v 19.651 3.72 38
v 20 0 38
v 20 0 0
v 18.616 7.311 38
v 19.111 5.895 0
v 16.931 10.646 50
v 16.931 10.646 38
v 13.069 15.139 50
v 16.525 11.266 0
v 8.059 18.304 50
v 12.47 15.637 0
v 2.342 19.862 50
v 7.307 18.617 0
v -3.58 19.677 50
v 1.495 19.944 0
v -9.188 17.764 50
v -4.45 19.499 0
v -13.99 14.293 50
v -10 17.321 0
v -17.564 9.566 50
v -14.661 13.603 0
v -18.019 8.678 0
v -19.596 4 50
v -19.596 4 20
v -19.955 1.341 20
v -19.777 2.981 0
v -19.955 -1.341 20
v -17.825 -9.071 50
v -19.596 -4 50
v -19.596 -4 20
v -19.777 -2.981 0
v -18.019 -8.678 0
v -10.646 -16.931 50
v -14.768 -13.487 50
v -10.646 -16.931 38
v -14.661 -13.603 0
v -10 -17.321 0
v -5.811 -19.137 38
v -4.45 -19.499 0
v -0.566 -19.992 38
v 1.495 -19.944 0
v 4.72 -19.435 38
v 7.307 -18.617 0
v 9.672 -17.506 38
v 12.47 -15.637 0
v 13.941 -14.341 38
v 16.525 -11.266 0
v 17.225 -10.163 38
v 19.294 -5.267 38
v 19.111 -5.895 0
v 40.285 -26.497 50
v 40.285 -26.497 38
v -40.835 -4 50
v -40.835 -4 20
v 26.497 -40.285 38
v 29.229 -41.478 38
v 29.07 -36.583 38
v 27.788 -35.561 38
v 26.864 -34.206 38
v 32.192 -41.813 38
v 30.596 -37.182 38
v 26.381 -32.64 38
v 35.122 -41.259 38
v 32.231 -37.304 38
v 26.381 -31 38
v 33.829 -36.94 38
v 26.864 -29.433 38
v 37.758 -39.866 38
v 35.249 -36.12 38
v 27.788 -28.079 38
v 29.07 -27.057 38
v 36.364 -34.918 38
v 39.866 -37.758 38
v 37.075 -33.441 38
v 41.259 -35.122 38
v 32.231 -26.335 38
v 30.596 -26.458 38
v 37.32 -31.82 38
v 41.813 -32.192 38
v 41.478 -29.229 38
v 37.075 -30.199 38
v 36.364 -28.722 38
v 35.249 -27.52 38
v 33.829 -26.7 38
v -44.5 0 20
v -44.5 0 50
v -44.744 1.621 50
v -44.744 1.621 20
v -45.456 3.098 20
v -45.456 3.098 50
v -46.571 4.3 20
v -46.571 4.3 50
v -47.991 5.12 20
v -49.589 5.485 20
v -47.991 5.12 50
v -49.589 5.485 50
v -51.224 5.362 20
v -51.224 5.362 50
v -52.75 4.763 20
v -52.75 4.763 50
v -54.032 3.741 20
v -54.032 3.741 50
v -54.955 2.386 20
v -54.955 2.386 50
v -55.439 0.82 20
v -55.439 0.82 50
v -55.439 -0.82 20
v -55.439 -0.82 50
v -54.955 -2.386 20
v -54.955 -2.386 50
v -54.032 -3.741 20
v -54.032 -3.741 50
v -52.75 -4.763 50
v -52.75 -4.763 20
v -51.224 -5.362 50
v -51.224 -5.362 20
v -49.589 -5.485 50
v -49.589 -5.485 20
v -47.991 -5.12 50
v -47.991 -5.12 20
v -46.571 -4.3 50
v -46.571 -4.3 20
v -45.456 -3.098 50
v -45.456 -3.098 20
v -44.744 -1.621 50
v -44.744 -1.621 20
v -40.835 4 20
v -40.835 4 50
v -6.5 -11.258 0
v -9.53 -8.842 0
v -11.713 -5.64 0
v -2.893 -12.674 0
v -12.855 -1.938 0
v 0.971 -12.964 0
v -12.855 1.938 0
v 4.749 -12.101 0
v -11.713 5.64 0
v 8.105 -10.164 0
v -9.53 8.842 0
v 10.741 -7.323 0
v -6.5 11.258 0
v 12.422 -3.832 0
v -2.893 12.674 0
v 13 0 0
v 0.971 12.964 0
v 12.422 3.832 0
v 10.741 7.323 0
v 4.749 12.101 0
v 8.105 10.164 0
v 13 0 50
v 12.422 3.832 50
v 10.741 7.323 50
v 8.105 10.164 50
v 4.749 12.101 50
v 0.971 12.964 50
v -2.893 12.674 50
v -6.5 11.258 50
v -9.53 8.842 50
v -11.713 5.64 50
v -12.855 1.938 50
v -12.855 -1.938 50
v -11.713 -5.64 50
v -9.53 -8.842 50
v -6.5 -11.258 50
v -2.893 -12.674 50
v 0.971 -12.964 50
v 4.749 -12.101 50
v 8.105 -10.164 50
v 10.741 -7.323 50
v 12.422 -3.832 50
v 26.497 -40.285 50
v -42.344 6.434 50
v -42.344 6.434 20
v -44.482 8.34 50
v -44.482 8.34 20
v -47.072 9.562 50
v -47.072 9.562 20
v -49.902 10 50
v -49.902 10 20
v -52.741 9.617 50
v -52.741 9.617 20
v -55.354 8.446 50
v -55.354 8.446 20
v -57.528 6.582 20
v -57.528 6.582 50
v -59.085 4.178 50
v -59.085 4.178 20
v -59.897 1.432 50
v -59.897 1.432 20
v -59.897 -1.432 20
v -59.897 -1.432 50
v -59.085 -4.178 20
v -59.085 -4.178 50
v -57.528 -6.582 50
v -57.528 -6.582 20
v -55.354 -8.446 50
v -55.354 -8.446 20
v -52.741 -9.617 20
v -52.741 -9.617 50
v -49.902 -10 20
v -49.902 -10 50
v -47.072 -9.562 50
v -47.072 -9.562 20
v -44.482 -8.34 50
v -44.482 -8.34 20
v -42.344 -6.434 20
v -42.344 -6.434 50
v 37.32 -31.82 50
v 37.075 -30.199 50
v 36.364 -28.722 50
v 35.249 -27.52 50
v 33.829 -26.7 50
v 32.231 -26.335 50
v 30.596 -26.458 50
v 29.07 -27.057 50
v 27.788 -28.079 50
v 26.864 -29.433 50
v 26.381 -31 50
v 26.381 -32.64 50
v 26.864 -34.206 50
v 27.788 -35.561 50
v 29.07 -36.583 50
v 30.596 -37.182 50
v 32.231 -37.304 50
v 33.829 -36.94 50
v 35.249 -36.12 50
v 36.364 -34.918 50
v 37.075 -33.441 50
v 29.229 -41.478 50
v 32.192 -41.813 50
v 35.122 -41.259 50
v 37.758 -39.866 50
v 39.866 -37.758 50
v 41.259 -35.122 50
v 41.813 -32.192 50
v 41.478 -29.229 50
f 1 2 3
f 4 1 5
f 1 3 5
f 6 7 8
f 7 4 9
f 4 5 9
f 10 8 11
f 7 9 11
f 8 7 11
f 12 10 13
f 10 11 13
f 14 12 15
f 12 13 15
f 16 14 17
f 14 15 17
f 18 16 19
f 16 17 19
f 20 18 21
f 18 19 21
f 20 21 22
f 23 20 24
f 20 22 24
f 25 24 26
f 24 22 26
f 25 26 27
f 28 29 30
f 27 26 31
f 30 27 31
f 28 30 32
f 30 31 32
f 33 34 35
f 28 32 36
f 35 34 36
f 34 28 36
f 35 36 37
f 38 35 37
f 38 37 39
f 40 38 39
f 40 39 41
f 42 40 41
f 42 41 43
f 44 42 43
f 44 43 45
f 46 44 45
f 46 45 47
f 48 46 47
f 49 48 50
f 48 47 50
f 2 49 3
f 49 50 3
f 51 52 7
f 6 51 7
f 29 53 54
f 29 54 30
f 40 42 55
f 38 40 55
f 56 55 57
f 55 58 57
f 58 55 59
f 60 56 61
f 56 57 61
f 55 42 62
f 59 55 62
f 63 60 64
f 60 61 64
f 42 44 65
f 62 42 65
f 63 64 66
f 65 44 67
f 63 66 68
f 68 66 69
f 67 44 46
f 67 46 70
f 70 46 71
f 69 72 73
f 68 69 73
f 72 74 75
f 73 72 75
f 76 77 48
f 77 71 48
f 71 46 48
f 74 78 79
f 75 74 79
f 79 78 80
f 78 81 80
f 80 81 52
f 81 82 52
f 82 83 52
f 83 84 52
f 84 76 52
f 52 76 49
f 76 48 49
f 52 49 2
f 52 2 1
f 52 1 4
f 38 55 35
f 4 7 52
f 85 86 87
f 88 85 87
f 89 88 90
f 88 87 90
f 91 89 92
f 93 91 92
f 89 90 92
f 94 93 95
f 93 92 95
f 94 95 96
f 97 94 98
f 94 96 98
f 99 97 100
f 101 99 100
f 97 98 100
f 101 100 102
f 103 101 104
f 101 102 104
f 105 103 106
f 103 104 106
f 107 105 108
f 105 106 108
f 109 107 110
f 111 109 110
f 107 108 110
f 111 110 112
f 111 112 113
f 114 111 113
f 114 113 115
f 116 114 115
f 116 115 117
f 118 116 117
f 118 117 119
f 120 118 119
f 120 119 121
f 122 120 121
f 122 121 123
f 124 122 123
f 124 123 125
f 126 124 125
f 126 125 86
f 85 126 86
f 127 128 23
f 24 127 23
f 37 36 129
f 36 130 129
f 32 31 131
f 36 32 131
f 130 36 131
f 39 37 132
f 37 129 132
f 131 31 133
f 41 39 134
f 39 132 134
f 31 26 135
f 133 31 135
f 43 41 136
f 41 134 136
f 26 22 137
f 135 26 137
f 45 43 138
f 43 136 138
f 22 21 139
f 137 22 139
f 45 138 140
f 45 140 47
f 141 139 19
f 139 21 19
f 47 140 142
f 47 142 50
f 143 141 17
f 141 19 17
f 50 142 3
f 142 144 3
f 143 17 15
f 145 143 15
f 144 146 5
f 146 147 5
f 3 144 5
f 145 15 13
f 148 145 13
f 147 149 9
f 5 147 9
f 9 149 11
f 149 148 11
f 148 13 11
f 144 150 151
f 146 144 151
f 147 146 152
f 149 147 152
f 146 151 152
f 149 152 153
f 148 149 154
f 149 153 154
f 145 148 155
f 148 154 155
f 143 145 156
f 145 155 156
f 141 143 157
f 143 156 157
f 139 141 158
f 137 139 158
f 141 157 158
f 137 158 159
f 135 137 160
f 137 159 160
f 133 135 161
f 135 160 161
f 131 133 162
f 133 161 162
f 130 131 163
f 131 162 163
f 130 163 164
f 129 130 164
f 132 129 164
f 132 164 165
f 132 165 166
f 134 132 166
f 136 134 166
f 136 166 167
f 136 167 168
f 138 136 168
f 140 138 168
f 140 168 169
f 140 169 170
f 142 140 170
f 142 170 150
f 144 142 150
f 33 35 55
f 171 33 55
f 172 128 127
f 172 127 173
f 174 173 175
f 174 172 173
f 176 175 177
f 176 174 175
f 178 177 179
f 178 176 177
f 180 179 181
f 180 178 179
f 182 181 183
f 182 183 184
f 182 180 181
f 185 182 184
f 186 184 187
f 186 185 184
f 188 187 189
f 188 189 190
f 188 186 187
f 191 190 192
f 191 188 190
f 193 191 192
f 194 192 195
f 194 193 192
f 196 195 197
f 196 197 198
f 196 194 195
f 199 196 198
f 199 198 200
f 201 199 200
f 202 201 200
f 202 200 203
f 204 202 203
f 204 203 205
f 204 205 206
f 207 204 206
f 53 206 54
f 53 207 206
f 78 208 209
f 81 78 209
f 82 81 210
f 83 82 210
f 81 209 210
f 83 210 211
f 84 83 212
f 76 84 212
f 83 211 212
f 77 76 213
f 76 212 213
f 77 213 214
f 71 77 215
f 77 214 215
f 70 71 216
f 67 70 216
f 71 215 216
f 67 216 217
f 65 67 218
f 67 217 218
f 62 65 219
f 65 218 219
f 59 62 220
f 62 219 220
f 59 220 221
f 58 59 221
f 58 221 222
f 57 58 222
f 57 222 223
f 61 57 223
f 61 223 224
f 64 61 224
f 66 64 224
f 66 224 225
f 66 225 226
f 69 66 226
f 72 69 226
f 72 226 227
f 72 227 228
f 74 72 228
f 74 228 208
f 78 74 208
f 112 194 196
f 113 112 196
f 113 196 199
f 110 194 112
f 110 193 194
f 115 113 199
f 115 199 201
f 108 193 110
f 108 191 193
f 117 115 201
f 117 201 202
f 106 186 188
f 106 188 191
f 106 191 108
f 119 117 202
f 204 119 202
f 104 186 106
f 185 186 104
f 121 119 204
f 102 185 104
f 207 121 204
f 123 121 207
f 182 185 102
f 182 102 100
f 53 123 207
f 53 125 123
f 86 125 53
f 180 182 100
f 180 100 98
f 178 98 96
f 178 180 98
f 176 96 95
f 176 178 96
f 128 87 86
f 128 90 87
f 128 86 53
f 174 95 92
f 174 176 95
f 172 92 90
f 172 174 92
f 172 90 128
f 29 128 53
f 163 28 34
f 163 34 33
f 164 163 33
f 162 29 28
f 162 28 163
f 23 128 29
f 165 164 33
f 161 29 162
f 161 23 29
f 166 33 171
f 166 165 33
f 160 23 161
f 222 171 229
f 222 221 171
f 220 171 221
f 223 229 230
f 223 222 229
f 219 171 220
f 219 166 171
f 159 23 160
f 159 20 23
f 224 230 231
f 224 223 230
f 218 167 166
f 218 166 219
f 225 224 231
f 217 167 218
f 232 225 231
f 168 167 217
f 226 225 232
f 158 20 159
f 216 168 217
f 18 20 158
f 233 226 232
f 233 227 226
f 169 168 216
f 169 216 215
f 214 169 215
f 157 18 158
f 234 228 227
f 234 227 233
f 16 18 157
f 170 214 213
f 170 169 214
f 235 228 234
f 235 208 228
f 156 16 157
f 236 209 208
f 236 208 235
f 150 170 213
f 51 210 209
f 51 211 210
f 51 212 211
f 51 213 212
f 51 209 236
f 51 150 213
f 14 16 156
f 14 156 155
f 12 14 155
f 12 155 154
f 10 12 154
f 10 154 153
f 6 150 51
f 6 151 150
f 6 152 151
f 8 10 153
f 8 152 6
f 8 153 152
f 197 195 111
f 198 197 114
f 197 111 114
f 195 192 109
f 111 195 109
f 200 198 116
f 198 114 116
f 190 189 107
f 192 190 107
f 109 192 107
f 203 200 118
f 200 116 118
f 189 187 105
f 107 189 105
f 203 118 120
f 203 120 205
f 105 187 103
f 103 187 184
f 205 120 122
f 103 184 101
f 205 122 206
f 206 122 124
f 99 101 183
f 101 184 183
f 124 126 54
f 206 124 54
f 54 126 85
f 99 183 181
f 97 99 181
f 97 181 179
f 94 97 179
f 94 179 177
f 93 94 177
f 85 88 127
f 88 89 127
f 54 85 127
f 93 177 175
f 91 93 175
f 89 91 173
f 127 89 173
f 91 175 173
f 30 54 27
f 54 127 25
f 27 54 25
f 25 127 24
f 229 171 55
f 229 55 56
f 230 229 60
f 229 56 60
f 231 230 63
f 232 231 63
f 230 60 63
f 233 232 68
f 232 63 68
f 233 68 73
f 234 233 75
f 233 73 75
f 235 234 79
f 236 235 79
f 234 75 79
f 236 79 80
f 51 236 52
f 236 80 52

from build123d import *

# Parameters (mm, degrees)
SKETCH_2_R          = 20
EXTRUDE_2_DEPTH     = 50
SKETCH_3_R          = 10
SKETCH_3_W          = 50
SKETCH_3_H          = 8
EXTRUDE_3_DEPTH     = 30
EXTRUDE_START       = -12
SKETCH_4_R          = 10
EXTRUDE_4_DEPTH     = 12
SKETCH_5_R          = 13
SKETCH_5_R_2        = 5.5
CUT_EXTRUDE_1_DEPTH = 89.593995864


with BuildPart() as part:
    # Эскиз2 → Бобышка-Вытянуть2 (new body)
    with BuildSketch(Plane.XY):
        Circle(SKETCH_2_R)
    extrude(amount=EXTRUDE_2_DEPTH)

    # Эскиз3 → Бобышка-Вытянуть3 (add)
    with BuildSketch(Plane.XY.offset(50)):
        with Locations((-50, 0)):
            Circle(SKETCH_3_R)
        with Locations((-25, 0)):
            Rectangle(SKETCH_3_W, SKETCH_3_H)
    extrude(amount=-EXTRUDE_3_DEPTH)

    # Эскиз4 → Бобышка-Вытянуть4 (add)
    with BuildSketch(Plane.XY.offset(50).offset(EXTRUDE_START)):
        with BuildLine():
            Line((-10.645829468, -16.931223079), (26.496890419, -40.285416693))
            ThreePointArc((26.496890419, -40.285416693), (24.748737342, -24.748737342), (40.285416693, -26.496890419))
            Line((40.285416693, -26.496890419), (16.931223079, 10.645829468))
            ThreePointArc((16.931223079, 10.645829468), (14.142135624, -14.142135624), (-10.645829468, -16.931223079))
        make_face()
        with Locations((31.819805153, -31.819805153)):
            Circle(SKETCH_4_R)
    extrude(amount=EXTRUDE_4_DEPTH)

    # Эскиз5 → Вырез-Вытянуть1 (cut, through all)
    with BuildSketch(Plane.XY.offset(50)):
        Circle(SKETCH_5_R)
        with Locations((-50, 0)):
            Circle(SKETCH_5_R_2)
        with Locations((31.819805153, -31.819805153)):
            Circle(SKETCH_5_R_2)
    extrude(amount=-CUT_EXTRUDE_1_DEPTH, mode=Mode.SUBTRACT)


solid = part.part
